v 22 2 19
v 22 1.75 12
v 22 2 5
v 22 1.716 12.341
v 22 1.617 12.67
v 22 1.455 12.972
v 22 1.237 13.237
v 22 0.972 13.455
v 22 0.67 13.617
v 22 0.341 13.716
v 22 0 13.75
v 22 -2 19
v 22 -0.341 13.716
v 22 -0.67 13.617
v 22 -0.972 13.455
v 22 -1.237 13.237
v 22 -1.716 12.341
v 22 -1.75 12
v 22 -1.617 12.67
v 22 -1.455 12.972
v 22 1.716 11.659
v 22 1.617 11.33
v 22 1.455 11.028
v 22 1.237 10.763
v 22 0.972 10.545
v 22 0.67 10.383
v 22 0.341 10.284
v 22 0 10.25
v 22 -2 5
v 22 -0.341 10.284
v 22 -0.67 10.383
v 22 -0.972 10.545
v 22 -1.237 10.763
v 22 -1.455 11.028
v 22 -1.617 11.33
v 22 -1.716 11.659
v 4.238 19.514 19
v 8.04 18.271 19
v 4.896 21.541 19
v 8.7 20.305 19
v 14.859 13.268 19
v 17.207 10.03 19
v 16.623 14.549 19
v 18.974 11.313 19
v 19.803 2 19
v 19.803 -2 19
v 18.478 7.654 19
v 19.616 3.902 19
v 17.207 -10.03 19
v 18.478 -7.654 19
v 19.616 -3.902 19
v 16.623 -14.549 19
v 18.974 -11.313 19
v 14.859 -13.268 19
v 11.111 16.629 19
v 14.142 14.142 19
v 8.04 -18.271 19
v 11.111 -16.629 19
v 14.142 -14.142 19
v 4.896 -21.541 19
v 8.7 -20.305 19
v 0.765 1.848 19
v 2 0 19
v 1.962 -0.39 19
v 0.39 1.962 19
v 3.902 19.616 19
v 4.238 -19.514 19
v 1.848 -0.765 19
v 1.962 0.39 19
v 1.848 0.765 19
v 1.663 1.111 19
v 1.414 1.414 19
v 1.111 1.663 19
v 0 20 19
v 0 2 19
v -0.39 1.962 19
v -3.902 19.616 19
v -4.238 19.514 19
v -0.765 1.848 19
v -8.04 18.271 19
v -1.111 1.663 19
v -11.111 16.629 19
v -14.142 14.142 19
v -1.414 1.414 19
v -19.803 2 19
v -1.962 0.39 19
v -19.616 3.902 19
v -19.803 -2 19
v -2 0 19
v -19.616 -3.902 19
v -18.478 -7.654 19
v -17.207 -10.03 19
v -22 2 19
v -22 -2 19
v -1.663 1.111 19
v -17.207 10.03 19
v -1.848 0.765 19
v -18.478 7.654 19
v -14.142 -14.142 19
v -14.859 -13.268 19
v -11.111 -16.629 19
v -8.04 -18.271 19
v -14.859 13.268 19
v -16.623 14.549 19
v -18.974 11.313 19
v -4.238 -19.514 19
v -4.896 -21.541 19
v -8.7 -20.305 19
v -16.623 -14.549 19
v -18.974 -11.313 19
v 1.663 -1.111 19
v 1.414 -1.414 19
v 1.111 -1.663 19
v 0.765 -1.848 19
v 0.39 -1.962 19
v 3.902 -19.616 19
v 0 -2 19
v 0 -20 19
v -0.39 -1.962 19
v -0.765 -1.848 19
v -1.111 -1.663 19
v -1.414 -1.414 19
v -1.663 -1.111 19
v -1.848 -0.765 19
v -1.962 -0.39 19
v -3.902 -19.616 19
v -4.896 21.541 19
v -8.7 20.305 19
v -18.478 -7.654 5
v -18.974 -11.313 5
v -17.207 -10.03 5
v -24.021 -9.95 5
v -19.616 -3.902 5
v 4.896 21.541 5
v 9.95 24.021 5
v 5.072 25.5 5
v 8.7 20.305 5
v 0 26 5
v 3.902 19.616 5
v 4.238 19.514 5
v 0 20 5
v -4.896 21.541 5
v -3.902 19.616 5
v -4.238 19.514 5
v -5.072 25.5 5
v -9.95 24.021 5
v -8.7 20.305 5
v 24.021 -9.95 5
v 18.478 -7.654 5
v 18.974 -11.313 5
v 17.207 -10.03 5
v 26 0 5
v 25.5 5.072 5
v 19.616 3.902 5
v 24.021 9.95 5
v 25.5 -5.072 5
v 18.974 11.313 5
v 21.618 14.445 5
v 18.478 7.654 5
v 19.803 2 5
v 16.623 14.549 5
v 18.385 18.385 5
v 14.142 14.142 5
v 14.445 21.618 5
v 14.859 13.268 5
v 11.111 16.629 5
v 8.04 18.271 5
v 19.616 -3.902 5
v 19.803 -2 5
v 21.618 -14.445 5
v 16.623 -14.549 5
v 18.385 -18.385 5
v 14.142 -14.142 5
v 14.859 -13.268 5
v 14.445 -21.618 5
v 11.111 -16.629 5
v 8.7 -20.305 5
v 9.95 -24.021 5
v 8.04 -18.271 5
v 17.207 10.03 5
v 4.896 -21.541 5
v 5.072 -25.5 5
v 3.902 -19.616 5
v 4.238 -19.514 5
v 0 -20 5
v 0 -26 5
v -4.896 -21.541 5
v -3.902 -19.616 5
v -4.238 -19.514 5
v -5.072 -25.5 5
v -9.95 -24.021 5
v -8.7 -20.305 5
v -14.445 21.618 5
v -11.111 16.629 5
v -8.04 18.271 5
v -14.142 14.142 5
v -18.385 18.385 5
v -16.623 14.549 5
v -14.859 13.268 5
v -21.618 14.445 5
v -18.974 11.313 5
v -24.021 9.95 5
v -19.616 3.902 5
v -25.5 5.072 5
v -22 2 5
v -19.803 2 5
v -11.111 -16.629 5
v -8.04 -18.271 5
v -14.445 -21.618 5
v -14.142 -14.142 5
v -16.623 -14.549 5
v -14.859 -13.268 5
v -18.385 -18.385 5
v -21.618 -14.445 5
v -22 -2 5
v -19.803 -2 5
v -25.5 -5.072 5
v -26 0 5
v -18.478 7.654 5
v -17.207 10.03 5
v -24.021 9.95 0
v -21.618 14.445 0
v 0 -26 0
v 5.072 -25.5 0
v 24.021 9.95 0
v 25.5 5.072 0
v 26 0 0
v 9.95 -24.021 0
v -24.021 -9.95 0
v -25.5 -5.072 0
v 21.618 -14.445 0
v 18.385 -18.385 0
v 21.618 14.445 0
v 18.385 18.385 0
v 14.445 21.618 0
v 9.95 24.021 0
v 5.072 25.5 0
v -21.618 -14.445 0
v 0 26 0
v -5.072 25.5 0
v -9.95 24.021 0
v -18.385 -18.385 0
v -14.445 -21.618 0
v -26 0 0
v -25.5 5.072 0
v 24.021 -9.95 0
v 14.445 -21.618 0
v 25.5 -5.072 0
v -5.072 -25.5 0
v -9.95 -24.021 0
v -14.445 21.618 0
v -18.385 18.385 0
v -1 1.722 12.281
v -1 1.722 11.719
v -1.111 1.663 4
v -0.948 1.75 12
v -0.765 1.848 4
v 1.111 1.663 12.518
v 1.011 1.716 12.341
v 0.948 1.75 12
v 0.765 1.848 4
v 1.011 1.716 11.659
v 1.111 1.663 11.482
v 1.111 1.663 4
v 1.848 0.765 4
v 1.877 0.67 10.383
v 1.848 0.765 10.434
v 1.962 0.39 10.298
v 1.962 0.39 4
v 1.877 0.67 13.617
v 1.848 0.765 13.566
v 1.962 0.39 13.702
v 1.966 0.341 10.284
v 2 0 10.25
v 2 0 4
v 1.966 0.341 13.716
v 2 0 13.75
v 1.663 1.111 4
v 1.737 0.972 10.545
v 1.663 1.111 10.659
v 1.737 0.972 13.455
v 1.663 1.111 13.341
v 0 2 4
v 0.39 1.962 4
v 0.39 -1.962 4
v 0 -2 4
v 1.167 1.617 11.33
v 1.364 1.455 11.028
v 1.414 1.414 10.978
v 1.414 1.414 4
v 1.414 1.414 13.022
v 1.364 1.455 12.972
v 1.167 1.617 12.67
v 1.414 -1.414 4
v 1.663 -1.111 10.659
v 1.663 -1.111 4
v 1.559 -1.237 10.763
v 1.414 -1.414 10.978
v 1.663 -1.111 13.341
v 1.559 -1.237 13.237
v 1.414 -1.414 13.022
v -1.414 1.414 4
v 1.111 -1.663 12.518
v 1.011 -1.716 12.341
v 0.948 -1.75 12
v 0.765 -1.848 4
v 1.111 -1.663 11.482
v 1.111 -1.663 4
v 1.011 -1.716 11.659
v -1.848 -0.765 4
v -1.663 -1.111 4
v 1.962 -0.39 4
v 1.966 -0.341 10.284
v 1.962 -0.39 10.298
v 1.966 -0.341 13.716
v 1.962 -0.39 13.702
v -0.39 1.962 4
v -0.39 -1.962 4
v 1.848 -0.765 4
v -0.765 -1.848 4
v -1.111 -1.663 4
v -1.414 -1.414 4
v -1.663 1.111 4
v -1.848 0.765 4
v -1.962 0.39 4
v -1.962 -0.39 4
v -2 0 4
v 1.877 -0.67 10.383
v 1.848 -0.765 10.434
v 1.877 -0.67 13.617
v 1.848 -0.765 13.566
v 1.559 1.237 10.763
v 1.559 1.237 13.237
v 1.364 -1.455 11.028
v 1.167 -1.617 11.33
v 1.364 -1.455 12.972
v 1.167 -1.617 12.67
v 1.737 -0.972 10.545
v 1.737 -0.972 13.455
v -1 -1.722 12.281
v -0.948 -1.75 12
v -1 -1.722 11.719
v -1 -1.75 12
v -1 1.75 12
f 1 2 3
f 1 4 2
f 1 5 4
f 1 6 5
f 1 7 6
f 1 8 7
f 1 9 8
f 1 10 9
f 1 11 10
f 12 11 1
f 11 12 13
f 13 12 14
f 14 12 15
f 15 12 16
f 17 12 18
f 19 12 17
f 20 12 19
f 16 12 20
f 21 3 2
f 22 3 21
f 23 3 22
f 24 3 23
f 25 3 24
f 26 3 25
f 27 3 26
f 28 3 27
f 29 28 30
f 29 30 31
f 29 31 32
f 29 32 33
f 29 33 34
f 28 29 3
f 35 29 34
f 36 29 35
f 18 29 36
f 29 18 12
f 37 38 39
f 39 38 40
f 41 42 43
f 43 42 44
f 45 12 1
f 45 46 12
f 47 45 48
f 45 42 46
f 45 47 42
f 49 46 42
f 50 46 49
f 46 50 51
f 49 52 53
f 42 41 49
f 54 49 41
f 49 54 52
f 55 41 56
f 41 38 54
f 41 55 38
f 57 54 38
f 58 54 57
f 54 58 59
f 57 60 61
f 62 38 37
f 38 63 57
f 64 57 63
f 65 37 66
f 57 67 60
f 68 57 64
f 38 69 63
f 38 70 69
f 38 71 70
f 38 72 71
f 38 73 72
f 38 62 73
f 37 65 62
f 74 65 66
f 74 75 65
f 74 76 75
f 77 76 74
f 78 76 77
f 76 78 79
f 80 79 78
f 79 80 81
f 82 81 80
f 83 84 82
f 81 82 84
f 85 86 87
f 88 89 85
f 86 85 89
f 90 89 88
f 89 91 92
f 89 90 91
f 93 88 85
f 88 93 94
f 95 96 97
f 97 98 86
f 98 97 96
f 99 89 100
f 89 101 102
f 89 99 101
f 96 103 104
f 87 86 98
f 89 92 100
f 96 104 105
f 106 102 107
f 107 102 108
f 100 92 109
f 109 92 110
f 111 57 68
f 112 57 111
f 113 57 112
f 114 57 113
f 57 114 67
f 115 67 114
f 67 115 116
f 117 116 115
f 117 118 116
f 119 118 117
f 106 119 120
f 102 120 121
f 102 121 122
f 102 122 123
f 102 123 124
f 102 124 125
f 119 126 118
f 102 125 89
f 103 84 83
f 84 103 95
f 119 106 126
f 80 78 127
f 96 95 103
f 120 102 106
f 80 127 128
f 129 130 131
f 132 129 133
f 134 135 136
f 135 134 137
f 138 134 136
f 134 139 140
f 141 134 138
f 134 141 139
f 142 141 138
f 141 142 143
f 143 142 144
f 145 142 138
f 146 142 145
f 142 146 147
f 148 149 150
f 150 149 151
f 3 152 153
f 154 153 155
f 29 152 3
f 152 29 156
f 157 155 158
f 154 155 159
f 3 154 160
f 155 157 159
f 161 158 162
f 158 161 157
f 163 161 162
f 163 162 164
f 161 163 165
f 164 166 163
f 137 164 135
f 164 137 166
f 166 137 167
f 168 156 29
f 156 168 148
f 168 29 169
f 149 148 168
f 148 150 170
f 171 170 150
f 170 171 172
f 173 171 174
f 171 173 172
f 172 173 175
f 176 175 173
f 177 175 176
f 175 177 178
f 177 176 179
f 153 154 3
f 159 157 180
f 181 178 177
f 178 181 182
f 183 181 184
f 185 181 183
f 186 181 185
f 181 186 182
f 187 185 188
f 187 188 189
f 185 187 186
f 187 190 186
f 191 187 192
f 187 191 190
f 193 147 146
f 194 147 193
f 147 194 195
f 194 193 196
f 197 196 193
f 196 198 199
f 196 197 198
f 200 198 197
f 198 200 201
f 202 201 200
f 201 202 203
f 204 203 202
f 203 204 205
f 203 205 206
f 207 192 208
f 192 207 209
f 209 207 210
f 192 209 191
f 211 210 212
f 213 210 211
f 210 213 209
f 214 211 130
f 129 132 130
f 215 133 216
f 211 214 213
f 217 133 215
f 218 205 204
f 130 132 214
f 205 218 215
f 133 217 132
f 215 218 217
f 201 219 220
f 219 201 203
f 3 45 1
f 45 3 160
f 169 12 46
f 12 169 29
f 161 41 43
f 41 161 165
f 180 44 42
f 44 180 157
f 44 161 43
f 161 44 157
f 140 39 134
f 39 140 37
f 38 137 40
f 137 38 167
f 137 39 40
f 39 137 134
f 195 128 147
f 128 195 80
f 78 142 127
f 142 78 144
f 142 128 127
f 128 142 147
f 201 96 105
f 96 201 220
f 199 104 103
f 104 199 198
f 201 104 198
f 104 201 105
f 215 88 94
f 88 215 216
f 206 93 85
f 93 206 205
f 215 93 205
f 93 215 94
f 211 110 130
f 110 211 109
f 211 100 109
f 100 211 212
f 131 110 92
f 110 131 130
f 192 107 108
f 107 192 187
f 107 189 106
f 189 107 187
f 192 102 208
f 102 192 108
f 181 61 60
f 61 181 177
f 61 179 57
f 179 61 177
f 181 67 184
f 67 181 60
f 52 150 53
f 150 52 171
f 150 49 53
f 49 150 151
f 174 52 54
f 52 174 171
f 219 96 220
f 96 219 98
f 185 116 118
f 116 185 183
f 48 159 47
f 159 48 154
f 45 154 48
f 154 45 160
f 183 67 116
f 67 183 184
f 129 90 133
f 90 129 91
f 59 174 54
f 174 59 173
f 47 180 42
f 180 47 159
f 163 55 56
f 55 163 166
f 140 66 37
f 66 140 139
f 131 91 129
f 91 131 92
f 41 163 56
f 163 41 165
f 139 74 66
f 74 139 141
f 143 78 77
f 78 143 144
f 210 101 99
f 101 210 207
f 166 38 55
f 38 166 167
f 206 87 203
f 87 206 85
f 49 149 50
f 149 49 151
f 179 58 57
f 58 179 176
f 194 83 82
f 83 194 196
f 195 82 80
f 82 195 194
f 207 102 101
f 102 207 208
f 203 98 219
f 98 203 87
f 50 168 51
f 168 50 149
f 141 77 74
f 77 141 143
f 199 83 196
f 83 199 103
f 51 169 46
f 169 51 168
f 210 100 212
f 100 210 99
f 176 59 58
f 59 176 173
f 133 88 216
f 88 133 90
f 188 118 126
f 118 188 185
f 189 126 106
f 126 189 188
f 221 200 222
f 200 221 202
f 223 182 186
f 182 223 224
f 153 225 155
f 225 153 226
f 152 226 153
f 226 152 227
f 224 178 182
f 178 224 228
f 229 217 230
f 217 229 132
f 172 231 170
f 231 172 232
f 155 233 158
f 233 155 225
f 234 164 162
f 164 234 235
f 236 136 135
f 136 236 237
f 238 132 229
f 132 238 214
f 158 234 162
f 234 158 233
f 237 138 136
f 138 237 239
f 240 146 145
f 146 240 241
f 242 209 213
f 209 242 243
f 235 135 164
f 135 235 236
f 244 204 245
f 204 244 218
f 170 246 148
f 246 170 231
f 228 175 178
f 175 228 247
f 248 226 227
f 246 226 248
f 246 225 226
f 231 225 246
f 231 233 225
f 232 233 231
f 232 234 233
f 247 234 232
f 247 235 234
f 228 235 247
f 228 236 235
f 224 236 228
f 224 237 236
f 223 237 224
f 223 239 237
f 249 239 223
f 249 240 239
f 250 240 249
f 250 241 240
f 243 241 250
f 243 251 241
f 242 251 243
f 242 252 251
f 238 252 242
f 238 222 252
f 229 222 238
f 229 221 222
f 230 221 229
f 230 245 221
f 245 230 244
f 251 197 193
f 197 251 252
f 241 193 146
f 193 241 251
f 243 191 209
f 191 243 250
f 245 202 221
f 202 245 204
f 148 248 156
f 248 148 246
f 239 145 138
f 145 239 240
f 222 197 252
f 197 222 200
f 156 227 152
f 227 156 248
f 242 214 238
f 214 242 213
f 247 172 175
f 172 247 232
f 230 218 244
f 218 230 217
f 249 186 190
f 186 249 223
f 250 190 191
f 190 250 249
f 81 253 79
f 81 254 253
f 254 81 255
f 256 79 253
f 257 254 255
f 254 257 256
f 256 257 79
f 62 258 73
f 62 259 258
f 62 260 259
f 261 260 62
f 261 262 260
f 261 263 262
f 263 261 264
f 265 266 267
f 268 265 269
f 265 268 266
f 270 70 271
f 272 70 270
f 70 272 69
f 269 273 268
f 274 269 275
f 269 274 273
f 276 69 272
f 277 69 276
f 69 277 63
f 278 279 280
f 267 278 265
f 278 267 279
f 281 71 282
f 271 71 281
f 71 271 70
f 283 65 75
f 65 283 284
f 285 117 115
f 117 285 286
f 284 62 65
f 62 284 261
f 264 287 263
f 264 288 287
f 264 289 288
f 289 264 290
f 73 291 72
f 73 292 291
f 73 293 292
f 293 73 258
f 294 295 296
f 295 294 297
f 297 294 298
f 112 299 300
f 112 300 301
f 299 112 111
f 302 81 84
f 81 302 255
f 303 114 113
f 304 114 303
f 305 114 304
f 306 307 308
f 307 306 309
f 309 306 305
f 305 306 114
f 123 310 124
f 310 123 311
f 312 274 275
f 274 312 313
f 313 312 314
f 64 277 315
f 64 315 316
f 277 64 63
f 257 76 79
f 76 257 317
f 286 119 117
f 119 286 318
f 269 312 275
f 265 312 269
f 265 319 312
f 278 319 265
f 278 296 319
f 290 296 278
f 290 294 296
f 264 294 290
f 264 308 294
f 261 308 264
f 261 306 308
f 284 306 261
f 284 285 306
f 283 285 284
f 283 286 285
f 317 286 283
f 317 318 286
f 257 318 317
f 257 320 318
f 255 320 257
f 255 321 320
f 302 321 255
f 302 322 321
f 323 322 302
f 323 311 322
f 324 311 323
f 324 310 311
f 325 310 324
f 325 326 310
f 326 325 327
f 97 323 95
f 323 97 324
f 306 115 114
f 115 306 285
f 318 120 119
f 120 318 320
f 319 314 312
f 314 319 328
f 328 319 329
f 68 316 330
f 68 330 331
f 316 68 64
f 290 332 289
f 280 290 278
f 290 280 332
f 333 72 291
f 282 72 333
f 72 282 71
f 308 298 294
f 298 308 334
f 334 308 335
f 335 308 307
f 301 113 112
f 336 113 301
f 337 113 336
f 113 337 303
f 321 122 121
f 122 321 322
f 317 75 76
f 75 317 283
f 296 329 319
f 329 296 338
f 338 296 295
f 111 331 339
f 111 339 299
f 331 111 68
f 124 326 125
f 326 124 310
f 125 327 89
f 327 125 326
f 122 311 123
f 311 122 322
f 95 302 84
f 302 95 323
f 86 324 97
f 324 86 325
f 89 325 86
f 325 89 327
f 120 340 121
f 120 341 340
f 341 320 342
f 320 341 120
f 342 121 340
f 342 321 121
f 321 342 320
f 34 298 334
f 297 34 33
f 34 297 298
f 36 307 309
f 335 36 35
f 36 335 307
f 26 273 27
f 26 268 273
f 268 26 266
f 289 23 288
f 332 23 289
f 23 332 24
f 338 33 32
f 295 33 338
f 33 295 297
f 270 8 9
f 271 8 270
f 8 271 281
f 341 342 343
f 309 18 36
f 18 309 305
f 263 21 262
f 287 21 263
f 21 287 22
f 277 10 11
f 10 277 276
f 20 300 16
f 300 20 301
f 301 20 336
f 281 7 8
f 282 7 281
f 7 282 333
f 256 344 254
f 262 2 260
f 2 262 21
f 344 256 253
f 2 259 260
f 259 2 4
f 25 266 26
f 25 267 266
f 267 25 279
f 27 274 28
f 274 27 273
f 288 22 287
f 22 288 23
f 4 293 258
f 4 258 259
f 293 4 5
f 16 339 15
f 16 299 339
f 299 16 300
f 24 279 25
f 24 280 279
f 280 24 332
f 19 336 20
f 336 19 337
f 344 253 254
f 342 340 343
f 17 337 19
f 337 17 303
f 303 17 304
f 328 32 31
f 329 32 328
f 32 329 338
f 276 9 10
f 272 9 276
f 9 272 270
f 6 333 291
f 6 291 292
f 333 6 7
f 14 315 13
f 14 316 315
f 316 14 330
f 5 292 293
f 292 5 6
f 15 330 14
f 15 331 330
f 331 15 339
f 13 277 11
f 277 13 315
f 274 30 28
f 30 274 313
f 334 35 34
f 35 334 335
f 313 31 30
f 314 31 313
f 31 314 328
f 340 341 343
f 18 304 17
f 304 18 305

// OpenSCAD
$fn = 32;

// ----------------------------------------------------------------------
// Control knob: skirt knob with grip ribs
// ----------------------------------------------------------------------

// --- parameters (mm) ---
skirt_d = 52;             // skirt diameter
skirt_t = 5;              // skirt thickness
rib_w = 4;                // grip rib width
rib_out = 3;              // grip rib radial protrusion
n_ribs = 10;              // number of grip ribs
knob_d = 40;              // knob body diameter
knob_h = 14;              // knob body height
bore_d = 4;               // shaft bore diameter
set_d = 3.5;              // set screw bore diameter

rib_step = 360 / n_ribs;  // rib angular step
total_h = skirt_t + knob_h;  // overall height

difference() {
  union() {
    translate([0, 0, skirt_t]) cylinder(h = knob_h, d = knob_d);
    cylinder(h = skirt_t, d = skirt_d);
    for (i = [0 : n_ribs - 1])
      rotate([0, 0, i * rib_step])
        translate([knob_d / 2 - 1, -rib_w / 2, skirt_t])
          cube([rib_out, rib_w, knob_h]);
  }
  translate([0, 0, skirt_t - 1]) cylinder(h = knob_h + 2, d = bore_d);
  translate([-1, 0, skirt_t + knob_h / 2]) rotate([0, 90, 0])
    cylinder(h = knob_d / 2 + bore_d / 2 + 2, d = set_d);
}
